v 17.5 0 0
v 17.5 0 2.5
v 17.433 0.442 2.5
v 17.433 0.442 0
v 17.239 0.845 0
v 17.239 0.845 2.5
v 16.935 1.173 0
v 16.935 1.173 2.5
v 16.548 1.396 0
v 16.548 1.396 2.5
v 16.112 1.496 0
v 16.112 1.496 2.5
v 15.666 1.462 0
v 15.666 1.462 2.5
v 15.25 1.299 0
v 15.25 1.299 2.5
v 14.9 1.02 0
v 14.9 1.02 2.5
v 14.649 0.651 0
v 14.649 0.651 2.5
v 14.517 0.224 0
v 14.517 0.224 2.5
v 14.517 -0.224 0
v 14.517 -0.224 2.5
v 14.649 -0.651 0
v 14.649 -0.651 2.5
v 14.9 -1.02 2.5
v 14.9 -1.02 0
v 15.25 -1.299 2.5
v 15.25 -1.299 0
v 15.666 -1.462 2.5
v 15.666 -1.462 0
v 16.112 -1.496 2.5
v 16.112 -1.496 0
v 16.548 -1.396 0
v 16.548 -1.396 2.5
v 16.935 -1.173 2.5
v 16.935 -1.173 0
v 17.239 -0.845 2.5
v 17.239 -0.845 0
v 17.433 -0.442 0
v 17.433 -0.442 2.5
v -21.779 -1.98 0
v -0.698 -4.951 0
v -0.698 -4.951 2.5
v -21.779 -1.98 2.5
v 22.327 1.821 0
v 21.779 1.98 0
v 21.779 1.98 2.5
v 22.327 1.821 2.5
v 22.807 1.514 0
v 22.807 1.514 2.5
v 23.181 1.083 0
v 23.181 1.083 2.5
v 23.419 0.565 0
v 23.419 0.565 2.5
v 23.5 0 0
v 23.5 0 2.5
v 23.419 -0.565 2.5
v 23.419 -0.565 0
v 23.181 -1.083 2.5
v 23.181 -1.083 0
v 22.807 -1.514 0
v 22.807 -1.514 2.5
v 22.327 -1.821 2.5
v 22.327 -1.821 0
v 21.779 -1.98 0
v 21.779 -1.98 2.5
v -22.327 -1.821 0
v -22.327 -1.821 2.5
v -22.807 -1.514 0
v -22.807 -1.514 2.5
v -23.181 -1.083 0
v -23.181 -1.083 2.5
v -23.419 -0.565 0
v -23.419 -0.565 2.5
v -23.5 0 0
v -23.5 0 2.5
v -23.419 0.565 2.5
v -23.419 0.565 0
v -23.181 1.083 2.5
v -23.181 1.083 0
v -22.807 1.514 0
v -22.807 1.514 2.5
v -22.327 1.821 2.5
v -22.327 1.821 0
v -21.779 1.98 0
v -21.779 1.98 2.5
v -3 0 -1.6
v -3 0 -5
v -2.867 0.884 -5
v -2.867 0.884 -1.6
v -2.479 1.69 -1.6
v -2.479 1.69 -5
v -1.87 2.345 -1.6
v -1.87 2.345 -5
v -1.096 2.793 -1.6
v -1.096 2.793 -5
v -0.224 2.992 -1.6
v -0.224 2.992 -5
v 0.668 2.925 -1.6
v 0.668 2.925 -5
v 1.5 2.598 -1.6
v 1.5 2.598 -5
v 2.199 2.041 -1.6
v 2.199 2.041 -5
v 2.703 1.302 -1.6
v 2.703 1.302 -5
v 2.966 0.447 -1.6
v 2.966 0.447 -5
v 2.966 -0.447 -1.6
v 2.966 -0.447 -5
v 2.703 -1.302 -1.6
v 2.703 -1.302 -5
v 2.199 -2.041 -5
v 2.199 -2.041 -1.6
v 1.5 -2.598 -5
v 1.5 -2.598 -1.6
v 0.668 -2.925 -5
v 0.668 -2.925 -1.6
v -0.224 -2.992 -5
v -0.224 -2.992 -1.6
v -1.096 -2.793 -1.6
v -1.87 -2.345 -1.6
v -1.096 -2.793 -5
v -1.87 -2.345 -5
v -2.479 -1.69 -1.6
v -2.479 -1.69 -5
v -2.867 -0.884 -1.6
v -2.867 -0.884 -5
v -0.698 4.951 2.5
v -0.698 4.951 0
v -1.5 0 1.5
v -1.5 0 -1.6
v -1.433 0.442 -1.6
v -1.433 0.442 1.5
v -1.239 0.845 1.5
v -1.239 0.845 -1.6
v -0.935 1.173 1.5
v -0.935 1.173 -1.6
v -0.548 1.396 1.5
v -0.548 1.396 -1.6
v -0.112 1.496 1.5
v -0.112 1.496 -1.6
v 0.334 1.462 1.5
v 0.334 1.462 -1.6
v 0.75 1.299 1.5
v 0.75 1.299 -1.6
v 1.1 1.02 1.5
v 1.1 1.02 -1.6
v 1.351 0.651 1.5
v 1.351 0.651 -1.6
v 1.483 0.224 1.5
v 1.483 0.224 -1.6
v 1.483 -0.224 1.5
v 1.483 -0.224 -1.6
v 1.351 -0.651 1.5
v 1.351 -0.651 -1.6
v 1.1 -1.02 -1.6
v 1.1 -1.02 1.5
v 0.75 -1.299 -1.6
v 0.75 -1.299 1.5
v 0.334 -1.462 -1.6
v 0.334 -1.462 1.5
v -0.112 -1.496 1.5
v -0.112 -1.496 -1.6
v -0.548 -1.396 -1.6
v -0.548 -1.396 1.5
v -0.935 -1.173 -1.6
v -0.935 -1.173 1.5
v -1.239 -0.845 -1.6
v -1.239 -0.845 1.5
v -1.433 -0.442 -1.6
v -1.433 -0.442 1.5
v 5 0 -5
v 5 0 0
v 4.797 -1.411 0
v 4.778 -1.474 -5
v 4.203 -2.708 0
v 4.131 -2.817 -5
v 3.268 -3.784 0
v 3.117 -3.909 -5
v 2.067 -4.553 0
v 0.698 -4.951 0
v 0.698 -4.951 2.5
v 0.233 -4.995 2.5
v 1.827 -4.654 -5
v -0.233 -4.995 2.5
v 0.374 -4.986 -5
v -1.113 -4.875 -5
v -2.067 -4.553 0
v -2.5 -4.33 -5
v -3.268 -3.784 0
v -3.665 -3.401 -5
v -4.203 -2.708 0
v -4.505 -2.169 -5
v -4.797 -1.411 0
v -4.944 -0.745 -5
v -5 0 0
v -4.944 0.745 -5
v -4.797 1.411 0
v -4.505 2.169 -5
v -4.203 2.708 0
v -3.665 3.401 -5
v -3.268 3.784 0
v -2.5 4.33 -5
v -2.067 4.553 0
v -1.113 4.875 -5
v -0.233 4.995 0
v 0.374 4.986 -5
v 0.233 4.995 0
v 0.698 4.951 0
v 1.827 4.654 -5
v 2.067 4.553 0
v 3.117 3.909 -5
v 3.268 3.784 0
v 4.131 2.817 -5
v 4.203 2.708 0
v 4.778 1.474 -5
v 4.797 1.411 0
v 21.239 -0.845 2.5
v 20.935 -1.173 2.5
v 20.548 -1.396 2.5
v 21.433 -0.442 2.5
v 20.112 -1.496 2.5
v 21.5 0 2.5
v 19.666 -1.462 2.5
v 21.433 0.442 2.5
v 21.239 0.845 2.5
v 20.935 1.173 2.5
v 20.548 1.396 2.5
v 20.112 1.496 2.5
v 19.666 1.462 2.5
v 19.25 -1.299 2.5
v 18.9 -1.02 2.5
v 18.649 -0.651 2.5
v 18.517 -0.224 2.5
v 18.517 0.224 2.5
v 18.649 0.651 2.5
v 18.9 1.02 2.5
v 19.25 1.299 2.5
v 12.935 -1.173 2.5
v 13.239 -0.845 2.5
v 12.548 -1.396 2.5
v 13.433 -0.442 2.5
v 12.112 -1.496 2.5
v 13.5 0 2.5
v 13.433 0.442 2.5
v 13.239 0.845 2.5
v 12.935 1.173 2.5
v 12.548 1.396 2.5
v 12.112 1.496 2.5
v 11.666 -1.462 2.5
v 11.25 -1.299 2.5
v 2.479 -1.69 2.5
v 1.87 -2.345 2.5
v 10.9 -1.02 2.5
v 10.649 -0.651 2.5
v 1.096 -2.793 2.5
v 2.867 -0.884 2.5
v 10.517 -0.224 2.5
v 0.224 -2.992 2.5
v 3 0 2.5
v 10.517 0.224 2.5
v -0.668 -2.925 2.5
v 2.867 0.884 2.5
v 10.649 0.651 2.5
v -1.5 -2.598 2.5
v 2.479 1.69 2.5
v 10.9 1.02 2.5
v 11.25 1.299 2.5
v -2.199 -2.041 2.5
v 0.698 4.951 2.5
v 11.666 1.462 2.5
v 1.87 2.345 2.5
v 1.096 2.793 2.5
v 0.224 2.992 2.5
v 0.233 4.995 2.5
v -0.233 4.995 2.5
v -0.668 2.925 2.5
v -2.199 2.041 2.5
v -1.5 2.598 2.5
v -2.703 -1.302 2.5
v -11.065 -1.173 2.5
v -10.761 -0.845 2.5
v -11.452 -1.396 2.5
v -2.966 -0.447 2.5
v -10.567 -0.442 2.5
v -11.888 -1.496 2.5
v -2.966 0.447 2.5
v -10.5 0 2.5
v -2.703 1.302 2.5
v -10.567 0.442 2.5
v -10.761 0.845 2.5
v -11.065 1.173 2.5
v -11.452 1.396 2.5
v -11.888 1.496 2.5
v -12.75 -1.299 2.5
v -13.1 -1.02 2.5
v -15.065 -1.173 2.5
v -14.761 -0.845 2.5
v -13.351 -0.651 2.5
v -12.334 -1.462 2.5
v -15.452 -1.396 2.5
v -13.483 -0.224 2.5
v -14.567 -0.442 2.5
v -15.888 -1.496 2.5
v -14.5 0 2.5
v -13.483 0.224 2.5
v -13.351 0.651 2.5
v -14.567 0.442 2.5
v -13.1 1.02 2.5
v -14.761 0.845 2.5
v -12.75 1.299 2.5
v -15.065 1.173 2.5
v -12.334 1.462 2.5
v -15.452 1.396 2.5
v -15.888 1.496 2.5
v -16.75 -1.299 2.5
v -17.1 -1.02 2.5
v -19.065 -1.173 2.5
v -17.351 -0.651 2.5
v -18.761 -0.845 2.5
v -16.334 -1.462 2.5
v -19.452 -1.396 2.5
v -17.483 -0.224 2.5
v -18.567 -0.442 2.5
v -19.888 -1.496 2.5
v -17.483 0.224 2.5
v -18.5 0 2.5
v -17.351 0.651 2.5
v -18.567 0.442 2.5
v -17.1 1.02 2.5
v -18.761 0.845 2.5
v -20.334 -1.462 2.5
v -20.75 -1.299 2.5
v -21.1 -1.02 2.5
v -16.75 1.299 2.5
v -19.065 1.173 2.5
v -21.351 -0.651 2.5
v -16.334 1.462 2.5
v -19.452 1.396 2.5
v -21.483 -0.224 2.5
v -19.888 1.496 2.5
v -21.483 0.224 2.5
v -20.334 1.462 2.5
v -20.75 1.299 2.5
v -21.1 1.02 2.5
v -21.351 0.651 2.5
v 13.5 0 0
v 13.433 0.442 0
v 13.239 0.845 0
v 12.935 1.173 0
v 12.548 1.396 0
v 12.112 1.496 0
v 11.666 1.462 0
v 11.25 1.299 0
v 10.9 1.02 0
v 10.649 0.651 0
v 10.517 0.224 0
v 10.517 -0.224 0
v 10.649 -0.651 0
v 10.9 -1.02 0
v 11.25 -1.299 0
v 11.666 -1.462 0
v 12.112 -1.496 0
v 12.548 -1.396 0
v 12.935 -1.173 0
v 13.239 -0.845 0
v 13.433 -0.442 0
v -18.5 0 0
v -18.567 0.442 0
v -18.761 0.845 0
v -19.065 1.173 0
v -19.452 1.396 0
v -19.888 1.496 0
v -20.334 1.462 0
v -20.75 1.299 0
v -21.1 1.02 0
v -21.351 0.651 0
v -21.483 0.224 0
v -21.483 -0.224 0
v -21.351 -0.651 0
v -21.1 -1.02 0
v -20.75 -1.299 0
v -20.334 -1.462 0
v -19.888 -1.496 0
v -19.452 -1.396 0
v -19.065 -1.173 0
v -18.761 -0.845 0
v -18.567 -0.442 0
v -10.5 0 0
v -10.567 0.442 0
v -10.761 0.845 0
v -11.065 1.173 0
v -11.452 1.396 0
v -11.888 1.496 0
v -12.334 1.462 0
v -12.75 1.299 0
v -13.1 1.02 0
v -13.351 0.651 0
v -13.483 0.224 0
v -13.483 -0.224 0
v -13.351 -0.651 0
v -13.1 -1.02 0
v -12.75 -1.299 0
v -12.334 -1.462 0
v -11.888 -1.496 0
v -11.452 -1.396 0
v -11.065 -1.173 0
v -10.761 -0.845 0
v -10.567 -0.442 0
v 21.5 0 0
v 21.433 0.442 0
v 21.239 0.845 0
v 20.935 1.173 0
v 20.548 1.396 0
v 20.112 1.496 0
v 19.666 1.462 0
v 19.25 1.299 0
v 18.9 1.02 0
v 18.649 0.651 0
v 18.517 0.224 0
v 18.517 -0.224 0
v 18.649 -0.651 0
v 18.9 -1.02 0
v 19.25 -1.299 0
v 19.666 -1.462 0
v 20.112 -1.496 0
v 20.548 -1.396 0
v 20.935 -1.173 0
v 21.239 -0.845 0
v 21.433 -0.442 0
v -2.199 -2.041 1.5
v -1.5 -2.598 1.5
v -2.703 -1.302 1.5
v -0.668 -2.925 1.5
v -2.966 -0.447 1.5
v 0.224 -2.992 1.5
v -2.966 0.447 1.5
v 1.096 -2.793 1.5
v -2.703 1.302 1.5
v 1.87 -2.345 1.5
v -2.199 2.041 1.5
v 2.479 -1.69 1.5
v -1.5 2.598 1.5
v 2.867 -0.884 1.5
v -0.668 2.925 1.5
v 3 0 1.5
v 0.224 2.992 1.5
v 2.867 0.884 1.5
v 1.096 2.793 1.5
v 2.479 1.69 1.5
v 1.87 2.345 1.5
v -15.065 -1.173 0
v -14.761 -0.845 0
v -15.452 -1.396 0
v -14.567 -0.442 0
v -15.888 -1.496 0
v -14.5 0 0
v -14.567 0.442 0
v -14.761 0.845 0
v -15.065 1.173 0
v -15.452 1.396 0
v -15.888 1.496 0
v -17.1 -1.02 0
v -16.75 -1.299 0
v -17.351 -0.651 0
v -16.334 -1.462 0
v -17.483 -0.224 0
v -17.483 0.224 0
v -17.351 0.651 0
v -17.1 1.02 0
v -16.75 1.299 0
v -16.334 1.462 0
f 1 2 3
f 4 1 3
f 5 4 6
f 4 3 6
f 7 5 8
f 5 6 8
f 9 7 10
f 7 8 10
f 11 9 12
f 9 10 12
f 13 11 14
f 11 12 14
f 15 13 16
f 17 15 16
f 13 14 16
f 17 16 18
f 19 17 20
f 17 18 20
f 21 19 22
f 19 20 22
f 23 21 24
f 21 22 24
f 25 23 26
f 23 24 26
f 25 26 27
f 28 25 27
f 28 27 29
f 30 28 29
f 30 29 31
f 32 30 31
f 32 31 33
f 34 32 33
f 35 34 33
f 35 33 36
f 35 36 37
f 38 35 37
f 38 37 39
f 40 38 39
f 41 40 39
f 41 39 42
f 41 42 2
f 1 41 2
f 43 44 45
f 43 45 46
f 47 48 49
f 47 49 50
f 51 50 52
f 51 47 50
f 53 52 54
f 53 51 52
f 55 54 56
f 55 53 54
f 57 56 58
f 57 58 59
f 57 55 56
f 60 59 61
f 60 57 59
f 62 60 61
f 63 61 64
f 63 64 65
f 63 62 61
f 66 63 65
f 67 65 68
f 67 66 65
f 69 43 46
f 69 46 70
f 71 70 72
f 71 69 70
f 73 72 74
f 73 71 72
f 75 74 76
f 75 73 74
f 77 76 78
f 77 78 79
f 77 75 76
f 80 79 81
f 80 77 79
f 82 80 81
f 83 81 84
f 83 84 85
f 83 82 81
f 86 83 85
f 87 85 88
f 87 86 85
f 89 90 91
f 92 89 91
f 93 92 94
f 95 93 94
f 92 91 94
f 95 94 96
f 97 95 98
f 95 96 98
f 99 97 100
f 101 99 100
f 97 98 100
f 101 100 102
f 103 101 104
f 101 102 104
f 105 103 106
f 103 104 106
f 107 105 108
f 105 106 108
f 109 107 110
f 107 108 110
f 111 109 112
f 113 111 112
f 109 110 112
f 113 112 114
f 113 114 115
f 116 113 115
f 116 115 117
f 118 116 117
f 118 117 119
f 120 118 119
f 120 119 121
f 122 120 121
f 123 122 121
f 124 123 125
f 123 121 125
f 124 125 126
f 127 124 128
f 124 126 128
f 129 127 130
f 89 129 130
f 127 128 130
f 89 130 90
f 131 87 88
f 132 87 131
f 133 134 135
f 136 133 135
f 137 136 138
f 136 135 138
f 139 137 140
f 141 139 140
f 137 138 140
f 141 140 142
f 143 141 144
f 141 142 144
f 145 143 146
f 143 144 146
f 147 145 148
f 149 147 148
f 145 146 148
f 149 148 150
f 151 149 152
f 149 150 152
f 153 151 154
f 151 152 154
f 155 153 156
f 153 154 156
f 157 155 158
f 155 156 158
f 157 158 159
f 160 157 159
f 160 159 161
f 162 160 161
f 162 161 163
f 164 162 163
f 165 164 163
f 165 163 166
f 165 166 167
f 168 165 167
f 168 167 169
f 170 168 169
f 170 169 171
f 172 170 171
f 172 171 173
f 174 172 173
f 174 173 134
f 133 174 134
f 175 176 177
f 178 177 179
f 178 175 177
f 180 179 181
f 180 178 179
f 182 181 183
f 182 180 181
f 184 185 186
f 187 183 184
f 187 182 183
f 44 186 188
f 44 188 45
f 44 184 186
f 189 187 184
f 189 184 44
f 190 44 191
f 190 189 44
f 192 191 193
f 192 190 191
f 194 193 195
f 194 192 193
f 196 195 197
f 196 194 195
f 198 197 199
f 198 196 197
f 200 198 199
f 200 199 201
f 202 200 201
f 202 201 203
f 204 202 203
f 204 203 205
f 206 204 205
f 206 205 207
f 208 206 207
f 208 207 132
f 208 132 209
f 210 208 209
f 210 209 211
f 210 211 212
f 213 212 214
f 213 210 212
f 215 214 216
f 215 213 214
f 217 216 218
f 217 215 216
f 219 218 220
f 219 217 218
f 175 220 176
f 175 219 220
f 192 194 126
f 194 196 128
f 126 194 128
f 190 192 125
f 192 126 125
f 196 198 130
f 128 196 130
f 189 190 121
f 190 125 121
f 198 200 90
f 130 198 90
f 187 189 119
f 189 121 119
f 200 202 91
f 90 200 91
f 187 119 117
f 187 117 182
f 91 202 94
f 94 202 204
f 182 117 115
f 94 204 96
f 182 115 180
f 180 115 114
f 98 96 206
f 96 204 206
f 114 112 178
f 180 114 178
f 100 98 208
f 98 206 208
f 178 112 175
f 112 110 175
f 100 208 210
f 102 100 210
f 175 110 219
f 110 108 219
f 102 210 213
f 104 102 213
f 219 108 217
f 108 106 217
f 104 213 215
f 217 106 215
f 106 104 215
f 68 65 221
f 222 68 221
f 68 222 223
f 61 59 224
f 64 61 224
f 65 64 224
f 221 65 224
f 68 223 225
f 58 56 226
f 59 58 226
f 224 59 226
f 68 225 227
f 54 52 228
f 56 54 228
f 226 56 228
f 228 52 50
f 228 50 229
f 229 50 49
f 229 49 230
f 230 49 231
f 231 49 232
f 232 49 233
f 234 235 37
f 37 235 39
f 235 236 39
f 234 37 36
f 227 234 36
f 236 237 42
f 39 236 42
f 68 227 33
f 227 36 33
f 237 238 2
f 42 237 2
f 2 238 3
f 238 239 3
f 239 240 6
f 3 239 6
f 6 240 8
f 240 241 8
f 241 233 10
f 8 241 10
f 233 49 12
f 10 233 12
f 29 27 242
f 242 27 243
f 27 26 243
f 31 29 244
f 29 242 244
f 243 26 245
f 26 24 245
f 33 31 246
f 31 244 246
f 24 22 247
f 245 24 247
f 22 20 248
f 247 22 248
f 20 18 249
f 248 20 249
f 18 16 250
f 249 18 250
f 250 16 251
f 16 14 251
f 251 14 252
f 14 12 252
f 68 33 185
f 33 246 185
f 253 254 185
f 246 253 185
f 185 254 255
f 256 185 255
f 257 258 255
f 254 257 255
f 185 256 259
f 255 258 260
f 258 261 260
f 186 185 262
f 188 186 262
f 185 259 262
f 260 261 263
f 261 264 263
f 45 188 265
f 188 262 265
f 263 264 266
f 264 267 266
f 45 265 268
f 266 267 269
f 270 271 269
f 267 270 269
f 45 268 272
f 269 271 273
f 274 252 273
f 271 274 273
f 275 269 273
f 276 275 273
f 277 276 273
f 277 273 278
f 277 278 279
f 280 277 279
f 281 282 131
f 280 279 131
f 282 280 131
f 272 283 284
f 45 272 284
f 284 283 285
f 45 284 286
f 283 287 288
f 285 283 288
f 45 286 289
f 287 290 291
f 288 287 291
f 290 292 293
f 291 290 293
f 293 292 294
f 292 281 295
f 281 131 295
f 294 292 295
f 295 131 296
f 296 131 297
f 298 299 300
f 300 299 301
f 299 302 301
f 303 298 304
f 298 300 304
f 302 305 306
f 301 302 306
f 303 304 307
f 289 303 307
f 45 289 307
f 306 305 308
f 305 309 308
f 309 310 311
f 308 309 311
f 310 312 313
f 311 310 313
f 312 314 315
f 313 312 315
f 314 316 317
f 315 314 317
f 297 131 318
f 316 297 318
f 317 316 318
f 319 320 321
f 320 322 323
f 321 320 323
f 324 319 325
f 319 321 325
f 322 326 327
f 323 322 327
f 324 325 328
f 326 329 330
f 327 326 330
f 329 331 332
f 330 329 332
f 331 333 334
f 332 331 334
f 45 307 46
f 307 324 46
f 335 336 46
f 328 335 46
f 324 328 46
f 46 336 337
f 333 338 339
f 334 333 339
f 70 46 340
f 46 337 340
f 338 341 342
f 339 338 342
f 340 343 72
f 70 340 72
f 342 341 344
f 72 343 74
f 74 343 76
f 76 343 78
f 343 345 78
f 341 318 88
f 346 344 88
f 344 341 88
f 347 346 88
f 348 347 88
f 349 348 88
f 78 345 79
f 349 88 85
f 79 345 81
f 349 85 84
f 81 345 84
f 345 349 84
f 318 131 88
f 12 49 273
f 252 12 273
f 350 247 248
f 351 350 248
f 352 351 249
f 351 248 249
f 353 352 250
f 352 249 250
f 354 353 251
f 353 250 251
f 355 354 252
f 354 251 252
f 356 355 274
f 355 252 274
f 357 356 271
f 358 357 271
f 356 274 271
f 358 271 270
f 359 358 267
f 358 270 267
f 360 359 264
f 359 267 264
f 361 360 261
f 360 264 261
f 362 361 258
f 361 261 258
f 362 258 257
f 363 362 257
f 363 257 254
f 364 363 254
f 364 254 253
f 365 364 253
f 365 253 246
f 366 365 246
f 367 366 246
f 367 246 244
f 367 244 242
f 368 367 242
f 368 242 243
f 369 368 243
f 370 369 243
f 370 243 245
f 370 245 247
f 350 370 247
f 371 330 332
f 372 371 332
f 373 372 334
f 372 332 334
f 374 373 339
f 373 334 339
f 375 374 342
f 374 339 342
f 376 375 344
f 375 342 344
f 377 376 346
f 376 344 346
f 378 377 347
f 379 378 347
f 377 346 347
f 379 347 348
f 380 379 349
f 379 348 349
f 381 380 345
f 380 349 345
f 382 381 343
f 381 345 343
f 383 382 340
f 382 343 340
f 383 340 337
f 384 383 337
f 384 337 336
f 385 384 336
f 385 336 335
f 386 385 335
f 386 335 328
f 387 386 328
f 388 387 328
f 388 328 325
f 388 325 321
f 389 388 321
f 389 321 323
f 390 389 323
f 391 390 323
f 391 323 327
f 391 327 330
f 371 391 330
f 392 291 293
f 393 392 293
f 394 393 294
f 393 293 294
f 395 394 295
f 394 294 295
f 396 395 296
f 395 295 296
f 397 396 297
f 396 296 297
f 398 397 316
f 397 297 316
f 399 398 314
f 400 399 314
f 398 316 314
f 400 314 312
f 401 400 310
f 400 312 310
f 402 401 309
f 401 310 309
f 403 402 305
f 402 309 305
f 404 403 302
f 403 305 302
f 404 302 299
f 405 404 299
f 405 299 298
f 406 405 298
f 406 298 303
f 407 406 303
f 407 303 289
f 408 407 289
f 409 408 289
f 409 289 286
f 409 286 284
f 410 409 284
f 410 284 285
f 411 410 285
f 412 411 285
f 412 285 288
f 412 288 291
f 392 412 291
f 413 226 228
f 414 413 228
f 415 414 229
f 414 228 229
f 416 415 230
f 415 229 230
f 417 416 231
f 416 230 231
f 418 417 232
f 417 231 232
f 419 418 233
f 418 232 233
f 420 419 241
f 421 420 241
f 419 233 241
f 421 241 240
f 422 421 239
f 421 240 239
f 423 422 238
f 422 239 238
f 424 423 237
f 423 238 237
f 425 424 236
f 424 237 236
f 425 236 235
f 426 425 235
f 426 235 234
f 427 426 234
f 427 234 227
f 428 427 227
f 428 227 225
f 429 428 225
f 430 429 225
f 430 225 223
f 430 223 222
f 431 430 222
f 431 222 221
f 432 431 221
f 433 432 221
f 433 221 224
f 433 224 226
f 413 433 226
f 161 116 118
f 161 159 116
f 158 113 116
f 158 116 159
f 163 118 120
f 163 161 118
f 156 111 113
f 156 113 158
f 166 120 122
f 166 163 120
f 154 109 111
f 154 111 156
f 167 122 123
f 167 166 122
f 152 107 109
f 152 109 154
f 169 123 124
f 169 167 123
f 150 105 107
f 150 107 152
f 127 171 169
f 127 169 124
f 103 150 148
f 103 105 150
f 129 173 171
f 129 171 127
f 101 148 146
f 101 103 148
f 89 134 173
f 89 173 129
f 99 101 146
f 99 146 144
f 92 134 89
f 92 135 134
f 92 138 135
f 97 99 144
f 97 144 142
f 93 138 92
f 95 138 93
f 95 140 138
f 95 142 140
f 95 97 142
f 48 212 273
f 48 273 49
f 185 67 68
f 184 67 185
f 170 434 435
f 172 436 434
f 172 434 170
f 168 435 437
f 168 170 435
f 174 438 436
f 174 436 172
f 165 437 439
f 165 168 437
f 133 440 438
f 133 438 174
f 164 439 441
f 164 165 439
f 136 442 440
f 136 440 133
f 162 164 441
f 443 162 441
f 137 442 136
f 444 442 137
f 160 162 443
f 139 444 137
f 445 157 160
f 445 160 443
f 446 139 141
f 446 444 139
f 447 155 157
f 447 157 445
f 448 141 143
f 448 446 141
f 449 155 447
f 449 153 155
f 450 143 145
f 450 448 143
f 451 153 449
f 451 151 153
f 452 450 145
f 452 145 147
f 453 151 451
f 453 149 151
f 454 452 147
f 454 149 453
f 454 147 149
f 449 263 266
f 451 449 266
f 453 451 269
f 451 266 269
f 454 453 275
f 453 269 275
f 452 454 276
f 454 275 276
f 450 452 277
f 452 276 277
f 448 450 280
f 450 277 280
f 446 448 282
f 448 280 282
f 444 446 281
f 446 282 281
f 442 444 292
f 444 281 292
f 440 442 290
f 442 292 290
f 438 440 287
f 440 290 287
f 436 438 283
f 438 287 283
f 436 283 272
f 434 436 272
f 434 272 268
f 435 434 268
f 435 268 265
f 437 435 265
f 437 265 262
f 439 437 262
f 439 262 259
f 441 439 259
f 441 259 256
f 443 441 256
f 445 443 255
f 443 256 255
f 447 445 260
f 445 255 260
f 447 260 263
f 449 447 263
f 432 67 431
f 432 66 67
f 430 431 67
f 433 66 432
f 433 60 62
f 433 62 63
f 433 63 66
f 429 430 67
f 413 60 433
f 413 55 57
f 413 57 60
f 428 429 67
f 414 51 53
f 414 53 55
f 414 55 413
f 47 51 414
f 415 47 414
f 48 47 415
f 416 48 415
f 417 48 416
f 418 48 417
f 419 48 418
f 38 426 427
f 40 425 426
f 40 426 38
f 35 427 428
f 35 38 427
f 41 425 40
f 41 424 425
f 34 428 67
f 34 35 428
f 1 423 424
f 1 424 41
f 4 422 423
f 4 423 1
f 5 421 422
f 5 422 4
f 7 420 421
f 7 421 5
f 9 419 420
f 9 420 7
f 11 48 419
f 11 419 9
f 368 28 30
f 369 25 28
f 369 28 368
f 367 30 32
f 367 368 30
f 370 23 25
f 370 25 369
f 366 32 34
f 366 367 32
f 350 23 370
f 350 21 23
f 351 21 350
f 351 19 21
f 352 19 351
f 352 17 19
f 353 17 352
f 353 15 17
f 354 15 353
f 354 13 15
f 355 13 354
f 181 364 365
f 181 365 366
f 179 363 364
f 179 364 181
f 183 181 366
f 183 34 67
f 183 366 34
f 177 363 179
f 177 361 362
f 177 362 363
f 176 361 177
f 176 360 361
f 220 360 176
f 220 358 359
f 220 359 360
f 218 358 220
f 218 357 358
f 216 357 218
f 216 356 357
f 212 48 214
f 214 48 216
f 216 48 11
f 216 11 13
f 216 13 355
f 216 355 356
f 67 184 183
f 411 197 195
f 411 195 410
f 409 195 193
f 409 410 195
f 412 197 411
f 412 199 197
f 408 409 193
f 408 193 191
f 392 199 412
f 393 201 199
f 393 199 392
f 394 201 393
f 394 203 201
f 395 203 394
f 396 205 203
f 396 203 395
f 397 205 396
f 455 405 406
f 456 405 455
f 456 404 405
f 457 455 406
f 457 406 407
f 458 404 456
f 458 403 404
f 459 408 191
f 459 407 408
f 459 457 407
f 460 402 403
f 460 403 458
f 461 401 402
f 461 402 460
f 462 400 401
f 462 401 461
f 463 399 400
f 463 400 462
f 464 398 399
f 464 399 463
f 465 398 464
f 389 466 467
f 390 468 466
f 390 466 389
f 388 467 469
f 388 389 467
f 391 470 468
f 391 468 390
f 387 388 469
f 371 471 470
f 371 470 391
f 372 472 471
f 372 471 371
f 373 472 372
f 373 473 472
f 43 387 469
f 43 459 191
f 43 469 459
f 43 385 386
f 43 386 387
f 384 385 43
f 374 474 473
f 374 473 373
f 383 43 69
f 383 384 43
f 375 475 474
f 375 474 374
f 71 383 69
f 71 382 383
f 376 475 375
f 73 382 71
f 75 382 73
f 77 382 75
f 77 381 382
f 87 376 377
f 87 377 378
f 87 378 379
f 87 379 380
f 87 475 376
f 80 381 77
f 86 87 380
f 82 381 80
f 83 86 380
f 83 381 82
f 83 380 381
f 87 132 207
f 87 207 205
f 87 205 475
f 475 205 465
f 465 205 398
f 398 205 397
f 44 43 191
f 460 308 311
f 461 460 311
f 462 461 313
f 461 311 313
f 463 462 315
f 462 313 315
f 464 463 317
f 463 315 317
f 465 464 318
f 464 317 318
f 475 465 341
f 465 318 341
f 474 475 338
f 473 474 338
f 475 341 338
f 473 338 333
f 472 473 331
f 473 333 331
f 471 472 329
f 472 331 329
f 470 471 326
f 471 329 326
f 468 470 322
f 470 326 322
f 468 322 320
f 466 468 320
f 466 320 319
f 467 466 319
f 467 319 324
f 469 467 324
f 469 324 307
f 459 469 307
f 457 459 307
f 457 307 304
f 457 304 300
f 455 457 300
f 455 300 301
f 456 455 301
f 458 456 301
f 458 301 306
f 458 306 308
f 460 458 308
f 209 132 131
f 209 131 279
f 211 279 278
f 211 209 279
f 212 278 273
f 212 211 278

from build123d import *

# Parameters (mm, degrees)
EXTRUDE_2_DEPTH     = 2.5
CUT_EXTRUDE_1_REACH = 4.5
SKETCH_3_R          = 1.5
SKETCH_5_R          = 5
EXTRUDE_3_DEPTH     = 7.5
SKETCH_6_R          = 3
CUT_EXTRUDE_2_DEPTH = 3.4
SKETCH_7_R          = 1.5
CUT_EXTRUDE_3_DEPTH = 5.1
SKETCH_8_R          = 3
CUT_EXTRUDE_4_DEPTH = 1


with BuildPart() as part:
    # 草图1 → 凸台-拉伸2 (new body)
    with BuildSketch(Plane.XY):
        with BuildLine():
            Line((-21.779069767, 1.980434312), (-0.697674419, 4.95108578))
            ThreePointArc((-0.697674419, 4.95108578), (0, 5), (0.697674419, 4.95108578))
            Line((0.697674419, 4.95108578), (21.779069767, 1.980434312))
            ThreePointArc((21.779069767, 1.980434312), (23.5, 0), (21.779069767, -1.980434312))
            Line((21.779069767, -1.980434312), (0.697674419, -4.95108578))
            ThreePointArc((0.697674419, -4.95108578), (0, -5), (-0.697674419, -4.95108578))
            Line((-0.697674419, -4.95108578), (-21.779069767, -1.980434312))
            ThreePointArc((-21.779069767, -1.980434312), (-23.5, 0), (-21.779069767, 1.980434312))
        make_face()
    extrude(amount=EXTRUDE_2_DEPTH)

    # 草图3 → 切除-拉伸1 (cut, up to next)
    with BuildSketch(Plane.XY.offset(2.5), mode=Mode.PRIVATE) as cut_extrude_1_sk1:
        with Locations((-12, 0)):
            Circle(SKETCH_3_R)
    cut_extrude_1_tool1 = extrude(cut_extrude_1_sk1.sketch, amount=-CUT_EXTRUDE_1_REACH, mode=Mode.PRIVATE) & part.part
    add(cut_extrude_1_tool1.solids().sort_by_distance((-12, 0, 2.5))[0], mode=Mode.SUBTRACT)
    # 草图3 → 切除-拉伸1 (cut, up to next)
    with BuildSketch(Plane.XY.offset(2.5), mode=Mode.PRIVATE) as cut_extrude_1_sk2:
        with Locations((-16, 0)):
            Circle(SKETCH_3_R)
    cut_extrude_1_tool2 = extrude(cut_extrude_1_sk2.sketch, amount=-CUT_EXTRUDE_1_REACH, mode=Mode.PRIVATE) & part.part
    add(cut_extrude_1_tool2.solids().sort_by_distance((-16, 0, 2.5))[0], mode=Mode.SUBTRACT)
    # 草图3 → 切除-拉伸1 (cut, up to next)
    with BuildSketch(Plane.XY.offset(2.5), mode=Mode.PRIVATE) as cut_extrude_1_sk3:
        with Locations((-20, 0)):
            Circle(SKETCH_3_R)
    cut_extrude_1_tool3 = extrude(cut_extrude_1_sk3.sketch, amount=-CUT_EXTRUDE_1_REACH, mode=Mode.PRIVATE) & part.part
    add(cut_extrude_1_tool3.solids().sort_by_distance((-20, 0, 2.5))[0], mode=Mode.SUBTRACT)
    # 草图3 → 切除-拉伸1 (cut, up to next)
    with BuildSketch(Plane.XY.offset(2.5), mode=Mode.PRIVATE) as cut_extrude_1_sk4:
        with Locations((12, 0)):
            Circle(SKETCH_3_R)
    cut_extrude_1_tool4 = extrude(cut_extrude_1_sk4.sketch, amount=-CUT_EXTRUDE_1_REACH, mode=Mode.PRIVATE) & part.part
    add(cut_extrude_1_tool4.solids().sort_by_distance((12, 0, 2.5))[0], mode=Mode.SUBTRACT)
    # 草图3 → 切除-拉伸1 (cut, up to next)
    with BuildSketch(Plane.XY.offset(2.5), mode=Mode.PRIVATE) as cut_extrude_1_sk5:
        with Locations((16, 0)):
            Circle(SKETCH_3_R)
    cut_extrude_1_tool5 = extrude(cut_extrude_1_sk5.sketch, amount=-CUT_EXTRUDE_1_REACH, mode=Mode.PRIVATE) & part.part
    add(cut_extrude_1_tool5.solids().sort_by_distance((16, 0, 2.5))[0], mode=Mode.SUBTRACT)
    # 草图3 → 切除-拉伸1 (cut, up to next)
    with BuildSketch(Plane.XY.offset(2.5), mode=Mode.PRIVATE) as cut_extrude_1_sk6:
        with Locations((20, 0)):
            Circle(SKETCH_3_R)
    cut_extrude_1_tool6 = extrude(cut_extrude_1_sk6.sketch, amount=-CUT_EXTRUDE_1_REACH, mode=Mode.PRIVATE) & part.part
    add(cut_extrude_1_tool6.solids().sort_by_distance((20, 0, 2.5))[0], mode=Mode.SUBTRACT)

    # 草图5 → 凸台-拉伸3 (add)
    with BuildSketch(Plane.XY.offset(2.5)):
        Circle(SKETCH_5_R)
    extrude(amount=-EXTRUDE_3_DEPTH)

    # 草图6 → 切除-拉伸2 (cut)
    with BuildSketch(Plane(origin=(0, 0, -5), x_dir=(-1, 0, 0), z_dir=(0, 0, -1))):
        Circle(SKETCH_6_R)
    extrude(amount=-CUT_EXTRUDE_2_DEPTH, mode=Mode.SUBTRACT)

    # 草图7 → 切除-拉伸3 (cut, through all)
    with BuildSketch(Plane(origin=(0, 0, -1.6), x_dir=(-1, 0, 0), z_dir=(0, 0, -1))):
        Circle(SKETCH_7_R)
    extrude(amount=-CUT_EXTRUDE_3_DEPTH, mode=Mode.SUBTRACT)

    # 草图8 → 切除-拉伸4 (cut)
    with BuildSketch(Plane.XY.offset(2.5)):
        Circle(SKETCH_8_R)
    extrude(amount=-CUT_EXTRUDE_4_DEPTH, mode=Mode.SUBTRACT)


solid = part.part
